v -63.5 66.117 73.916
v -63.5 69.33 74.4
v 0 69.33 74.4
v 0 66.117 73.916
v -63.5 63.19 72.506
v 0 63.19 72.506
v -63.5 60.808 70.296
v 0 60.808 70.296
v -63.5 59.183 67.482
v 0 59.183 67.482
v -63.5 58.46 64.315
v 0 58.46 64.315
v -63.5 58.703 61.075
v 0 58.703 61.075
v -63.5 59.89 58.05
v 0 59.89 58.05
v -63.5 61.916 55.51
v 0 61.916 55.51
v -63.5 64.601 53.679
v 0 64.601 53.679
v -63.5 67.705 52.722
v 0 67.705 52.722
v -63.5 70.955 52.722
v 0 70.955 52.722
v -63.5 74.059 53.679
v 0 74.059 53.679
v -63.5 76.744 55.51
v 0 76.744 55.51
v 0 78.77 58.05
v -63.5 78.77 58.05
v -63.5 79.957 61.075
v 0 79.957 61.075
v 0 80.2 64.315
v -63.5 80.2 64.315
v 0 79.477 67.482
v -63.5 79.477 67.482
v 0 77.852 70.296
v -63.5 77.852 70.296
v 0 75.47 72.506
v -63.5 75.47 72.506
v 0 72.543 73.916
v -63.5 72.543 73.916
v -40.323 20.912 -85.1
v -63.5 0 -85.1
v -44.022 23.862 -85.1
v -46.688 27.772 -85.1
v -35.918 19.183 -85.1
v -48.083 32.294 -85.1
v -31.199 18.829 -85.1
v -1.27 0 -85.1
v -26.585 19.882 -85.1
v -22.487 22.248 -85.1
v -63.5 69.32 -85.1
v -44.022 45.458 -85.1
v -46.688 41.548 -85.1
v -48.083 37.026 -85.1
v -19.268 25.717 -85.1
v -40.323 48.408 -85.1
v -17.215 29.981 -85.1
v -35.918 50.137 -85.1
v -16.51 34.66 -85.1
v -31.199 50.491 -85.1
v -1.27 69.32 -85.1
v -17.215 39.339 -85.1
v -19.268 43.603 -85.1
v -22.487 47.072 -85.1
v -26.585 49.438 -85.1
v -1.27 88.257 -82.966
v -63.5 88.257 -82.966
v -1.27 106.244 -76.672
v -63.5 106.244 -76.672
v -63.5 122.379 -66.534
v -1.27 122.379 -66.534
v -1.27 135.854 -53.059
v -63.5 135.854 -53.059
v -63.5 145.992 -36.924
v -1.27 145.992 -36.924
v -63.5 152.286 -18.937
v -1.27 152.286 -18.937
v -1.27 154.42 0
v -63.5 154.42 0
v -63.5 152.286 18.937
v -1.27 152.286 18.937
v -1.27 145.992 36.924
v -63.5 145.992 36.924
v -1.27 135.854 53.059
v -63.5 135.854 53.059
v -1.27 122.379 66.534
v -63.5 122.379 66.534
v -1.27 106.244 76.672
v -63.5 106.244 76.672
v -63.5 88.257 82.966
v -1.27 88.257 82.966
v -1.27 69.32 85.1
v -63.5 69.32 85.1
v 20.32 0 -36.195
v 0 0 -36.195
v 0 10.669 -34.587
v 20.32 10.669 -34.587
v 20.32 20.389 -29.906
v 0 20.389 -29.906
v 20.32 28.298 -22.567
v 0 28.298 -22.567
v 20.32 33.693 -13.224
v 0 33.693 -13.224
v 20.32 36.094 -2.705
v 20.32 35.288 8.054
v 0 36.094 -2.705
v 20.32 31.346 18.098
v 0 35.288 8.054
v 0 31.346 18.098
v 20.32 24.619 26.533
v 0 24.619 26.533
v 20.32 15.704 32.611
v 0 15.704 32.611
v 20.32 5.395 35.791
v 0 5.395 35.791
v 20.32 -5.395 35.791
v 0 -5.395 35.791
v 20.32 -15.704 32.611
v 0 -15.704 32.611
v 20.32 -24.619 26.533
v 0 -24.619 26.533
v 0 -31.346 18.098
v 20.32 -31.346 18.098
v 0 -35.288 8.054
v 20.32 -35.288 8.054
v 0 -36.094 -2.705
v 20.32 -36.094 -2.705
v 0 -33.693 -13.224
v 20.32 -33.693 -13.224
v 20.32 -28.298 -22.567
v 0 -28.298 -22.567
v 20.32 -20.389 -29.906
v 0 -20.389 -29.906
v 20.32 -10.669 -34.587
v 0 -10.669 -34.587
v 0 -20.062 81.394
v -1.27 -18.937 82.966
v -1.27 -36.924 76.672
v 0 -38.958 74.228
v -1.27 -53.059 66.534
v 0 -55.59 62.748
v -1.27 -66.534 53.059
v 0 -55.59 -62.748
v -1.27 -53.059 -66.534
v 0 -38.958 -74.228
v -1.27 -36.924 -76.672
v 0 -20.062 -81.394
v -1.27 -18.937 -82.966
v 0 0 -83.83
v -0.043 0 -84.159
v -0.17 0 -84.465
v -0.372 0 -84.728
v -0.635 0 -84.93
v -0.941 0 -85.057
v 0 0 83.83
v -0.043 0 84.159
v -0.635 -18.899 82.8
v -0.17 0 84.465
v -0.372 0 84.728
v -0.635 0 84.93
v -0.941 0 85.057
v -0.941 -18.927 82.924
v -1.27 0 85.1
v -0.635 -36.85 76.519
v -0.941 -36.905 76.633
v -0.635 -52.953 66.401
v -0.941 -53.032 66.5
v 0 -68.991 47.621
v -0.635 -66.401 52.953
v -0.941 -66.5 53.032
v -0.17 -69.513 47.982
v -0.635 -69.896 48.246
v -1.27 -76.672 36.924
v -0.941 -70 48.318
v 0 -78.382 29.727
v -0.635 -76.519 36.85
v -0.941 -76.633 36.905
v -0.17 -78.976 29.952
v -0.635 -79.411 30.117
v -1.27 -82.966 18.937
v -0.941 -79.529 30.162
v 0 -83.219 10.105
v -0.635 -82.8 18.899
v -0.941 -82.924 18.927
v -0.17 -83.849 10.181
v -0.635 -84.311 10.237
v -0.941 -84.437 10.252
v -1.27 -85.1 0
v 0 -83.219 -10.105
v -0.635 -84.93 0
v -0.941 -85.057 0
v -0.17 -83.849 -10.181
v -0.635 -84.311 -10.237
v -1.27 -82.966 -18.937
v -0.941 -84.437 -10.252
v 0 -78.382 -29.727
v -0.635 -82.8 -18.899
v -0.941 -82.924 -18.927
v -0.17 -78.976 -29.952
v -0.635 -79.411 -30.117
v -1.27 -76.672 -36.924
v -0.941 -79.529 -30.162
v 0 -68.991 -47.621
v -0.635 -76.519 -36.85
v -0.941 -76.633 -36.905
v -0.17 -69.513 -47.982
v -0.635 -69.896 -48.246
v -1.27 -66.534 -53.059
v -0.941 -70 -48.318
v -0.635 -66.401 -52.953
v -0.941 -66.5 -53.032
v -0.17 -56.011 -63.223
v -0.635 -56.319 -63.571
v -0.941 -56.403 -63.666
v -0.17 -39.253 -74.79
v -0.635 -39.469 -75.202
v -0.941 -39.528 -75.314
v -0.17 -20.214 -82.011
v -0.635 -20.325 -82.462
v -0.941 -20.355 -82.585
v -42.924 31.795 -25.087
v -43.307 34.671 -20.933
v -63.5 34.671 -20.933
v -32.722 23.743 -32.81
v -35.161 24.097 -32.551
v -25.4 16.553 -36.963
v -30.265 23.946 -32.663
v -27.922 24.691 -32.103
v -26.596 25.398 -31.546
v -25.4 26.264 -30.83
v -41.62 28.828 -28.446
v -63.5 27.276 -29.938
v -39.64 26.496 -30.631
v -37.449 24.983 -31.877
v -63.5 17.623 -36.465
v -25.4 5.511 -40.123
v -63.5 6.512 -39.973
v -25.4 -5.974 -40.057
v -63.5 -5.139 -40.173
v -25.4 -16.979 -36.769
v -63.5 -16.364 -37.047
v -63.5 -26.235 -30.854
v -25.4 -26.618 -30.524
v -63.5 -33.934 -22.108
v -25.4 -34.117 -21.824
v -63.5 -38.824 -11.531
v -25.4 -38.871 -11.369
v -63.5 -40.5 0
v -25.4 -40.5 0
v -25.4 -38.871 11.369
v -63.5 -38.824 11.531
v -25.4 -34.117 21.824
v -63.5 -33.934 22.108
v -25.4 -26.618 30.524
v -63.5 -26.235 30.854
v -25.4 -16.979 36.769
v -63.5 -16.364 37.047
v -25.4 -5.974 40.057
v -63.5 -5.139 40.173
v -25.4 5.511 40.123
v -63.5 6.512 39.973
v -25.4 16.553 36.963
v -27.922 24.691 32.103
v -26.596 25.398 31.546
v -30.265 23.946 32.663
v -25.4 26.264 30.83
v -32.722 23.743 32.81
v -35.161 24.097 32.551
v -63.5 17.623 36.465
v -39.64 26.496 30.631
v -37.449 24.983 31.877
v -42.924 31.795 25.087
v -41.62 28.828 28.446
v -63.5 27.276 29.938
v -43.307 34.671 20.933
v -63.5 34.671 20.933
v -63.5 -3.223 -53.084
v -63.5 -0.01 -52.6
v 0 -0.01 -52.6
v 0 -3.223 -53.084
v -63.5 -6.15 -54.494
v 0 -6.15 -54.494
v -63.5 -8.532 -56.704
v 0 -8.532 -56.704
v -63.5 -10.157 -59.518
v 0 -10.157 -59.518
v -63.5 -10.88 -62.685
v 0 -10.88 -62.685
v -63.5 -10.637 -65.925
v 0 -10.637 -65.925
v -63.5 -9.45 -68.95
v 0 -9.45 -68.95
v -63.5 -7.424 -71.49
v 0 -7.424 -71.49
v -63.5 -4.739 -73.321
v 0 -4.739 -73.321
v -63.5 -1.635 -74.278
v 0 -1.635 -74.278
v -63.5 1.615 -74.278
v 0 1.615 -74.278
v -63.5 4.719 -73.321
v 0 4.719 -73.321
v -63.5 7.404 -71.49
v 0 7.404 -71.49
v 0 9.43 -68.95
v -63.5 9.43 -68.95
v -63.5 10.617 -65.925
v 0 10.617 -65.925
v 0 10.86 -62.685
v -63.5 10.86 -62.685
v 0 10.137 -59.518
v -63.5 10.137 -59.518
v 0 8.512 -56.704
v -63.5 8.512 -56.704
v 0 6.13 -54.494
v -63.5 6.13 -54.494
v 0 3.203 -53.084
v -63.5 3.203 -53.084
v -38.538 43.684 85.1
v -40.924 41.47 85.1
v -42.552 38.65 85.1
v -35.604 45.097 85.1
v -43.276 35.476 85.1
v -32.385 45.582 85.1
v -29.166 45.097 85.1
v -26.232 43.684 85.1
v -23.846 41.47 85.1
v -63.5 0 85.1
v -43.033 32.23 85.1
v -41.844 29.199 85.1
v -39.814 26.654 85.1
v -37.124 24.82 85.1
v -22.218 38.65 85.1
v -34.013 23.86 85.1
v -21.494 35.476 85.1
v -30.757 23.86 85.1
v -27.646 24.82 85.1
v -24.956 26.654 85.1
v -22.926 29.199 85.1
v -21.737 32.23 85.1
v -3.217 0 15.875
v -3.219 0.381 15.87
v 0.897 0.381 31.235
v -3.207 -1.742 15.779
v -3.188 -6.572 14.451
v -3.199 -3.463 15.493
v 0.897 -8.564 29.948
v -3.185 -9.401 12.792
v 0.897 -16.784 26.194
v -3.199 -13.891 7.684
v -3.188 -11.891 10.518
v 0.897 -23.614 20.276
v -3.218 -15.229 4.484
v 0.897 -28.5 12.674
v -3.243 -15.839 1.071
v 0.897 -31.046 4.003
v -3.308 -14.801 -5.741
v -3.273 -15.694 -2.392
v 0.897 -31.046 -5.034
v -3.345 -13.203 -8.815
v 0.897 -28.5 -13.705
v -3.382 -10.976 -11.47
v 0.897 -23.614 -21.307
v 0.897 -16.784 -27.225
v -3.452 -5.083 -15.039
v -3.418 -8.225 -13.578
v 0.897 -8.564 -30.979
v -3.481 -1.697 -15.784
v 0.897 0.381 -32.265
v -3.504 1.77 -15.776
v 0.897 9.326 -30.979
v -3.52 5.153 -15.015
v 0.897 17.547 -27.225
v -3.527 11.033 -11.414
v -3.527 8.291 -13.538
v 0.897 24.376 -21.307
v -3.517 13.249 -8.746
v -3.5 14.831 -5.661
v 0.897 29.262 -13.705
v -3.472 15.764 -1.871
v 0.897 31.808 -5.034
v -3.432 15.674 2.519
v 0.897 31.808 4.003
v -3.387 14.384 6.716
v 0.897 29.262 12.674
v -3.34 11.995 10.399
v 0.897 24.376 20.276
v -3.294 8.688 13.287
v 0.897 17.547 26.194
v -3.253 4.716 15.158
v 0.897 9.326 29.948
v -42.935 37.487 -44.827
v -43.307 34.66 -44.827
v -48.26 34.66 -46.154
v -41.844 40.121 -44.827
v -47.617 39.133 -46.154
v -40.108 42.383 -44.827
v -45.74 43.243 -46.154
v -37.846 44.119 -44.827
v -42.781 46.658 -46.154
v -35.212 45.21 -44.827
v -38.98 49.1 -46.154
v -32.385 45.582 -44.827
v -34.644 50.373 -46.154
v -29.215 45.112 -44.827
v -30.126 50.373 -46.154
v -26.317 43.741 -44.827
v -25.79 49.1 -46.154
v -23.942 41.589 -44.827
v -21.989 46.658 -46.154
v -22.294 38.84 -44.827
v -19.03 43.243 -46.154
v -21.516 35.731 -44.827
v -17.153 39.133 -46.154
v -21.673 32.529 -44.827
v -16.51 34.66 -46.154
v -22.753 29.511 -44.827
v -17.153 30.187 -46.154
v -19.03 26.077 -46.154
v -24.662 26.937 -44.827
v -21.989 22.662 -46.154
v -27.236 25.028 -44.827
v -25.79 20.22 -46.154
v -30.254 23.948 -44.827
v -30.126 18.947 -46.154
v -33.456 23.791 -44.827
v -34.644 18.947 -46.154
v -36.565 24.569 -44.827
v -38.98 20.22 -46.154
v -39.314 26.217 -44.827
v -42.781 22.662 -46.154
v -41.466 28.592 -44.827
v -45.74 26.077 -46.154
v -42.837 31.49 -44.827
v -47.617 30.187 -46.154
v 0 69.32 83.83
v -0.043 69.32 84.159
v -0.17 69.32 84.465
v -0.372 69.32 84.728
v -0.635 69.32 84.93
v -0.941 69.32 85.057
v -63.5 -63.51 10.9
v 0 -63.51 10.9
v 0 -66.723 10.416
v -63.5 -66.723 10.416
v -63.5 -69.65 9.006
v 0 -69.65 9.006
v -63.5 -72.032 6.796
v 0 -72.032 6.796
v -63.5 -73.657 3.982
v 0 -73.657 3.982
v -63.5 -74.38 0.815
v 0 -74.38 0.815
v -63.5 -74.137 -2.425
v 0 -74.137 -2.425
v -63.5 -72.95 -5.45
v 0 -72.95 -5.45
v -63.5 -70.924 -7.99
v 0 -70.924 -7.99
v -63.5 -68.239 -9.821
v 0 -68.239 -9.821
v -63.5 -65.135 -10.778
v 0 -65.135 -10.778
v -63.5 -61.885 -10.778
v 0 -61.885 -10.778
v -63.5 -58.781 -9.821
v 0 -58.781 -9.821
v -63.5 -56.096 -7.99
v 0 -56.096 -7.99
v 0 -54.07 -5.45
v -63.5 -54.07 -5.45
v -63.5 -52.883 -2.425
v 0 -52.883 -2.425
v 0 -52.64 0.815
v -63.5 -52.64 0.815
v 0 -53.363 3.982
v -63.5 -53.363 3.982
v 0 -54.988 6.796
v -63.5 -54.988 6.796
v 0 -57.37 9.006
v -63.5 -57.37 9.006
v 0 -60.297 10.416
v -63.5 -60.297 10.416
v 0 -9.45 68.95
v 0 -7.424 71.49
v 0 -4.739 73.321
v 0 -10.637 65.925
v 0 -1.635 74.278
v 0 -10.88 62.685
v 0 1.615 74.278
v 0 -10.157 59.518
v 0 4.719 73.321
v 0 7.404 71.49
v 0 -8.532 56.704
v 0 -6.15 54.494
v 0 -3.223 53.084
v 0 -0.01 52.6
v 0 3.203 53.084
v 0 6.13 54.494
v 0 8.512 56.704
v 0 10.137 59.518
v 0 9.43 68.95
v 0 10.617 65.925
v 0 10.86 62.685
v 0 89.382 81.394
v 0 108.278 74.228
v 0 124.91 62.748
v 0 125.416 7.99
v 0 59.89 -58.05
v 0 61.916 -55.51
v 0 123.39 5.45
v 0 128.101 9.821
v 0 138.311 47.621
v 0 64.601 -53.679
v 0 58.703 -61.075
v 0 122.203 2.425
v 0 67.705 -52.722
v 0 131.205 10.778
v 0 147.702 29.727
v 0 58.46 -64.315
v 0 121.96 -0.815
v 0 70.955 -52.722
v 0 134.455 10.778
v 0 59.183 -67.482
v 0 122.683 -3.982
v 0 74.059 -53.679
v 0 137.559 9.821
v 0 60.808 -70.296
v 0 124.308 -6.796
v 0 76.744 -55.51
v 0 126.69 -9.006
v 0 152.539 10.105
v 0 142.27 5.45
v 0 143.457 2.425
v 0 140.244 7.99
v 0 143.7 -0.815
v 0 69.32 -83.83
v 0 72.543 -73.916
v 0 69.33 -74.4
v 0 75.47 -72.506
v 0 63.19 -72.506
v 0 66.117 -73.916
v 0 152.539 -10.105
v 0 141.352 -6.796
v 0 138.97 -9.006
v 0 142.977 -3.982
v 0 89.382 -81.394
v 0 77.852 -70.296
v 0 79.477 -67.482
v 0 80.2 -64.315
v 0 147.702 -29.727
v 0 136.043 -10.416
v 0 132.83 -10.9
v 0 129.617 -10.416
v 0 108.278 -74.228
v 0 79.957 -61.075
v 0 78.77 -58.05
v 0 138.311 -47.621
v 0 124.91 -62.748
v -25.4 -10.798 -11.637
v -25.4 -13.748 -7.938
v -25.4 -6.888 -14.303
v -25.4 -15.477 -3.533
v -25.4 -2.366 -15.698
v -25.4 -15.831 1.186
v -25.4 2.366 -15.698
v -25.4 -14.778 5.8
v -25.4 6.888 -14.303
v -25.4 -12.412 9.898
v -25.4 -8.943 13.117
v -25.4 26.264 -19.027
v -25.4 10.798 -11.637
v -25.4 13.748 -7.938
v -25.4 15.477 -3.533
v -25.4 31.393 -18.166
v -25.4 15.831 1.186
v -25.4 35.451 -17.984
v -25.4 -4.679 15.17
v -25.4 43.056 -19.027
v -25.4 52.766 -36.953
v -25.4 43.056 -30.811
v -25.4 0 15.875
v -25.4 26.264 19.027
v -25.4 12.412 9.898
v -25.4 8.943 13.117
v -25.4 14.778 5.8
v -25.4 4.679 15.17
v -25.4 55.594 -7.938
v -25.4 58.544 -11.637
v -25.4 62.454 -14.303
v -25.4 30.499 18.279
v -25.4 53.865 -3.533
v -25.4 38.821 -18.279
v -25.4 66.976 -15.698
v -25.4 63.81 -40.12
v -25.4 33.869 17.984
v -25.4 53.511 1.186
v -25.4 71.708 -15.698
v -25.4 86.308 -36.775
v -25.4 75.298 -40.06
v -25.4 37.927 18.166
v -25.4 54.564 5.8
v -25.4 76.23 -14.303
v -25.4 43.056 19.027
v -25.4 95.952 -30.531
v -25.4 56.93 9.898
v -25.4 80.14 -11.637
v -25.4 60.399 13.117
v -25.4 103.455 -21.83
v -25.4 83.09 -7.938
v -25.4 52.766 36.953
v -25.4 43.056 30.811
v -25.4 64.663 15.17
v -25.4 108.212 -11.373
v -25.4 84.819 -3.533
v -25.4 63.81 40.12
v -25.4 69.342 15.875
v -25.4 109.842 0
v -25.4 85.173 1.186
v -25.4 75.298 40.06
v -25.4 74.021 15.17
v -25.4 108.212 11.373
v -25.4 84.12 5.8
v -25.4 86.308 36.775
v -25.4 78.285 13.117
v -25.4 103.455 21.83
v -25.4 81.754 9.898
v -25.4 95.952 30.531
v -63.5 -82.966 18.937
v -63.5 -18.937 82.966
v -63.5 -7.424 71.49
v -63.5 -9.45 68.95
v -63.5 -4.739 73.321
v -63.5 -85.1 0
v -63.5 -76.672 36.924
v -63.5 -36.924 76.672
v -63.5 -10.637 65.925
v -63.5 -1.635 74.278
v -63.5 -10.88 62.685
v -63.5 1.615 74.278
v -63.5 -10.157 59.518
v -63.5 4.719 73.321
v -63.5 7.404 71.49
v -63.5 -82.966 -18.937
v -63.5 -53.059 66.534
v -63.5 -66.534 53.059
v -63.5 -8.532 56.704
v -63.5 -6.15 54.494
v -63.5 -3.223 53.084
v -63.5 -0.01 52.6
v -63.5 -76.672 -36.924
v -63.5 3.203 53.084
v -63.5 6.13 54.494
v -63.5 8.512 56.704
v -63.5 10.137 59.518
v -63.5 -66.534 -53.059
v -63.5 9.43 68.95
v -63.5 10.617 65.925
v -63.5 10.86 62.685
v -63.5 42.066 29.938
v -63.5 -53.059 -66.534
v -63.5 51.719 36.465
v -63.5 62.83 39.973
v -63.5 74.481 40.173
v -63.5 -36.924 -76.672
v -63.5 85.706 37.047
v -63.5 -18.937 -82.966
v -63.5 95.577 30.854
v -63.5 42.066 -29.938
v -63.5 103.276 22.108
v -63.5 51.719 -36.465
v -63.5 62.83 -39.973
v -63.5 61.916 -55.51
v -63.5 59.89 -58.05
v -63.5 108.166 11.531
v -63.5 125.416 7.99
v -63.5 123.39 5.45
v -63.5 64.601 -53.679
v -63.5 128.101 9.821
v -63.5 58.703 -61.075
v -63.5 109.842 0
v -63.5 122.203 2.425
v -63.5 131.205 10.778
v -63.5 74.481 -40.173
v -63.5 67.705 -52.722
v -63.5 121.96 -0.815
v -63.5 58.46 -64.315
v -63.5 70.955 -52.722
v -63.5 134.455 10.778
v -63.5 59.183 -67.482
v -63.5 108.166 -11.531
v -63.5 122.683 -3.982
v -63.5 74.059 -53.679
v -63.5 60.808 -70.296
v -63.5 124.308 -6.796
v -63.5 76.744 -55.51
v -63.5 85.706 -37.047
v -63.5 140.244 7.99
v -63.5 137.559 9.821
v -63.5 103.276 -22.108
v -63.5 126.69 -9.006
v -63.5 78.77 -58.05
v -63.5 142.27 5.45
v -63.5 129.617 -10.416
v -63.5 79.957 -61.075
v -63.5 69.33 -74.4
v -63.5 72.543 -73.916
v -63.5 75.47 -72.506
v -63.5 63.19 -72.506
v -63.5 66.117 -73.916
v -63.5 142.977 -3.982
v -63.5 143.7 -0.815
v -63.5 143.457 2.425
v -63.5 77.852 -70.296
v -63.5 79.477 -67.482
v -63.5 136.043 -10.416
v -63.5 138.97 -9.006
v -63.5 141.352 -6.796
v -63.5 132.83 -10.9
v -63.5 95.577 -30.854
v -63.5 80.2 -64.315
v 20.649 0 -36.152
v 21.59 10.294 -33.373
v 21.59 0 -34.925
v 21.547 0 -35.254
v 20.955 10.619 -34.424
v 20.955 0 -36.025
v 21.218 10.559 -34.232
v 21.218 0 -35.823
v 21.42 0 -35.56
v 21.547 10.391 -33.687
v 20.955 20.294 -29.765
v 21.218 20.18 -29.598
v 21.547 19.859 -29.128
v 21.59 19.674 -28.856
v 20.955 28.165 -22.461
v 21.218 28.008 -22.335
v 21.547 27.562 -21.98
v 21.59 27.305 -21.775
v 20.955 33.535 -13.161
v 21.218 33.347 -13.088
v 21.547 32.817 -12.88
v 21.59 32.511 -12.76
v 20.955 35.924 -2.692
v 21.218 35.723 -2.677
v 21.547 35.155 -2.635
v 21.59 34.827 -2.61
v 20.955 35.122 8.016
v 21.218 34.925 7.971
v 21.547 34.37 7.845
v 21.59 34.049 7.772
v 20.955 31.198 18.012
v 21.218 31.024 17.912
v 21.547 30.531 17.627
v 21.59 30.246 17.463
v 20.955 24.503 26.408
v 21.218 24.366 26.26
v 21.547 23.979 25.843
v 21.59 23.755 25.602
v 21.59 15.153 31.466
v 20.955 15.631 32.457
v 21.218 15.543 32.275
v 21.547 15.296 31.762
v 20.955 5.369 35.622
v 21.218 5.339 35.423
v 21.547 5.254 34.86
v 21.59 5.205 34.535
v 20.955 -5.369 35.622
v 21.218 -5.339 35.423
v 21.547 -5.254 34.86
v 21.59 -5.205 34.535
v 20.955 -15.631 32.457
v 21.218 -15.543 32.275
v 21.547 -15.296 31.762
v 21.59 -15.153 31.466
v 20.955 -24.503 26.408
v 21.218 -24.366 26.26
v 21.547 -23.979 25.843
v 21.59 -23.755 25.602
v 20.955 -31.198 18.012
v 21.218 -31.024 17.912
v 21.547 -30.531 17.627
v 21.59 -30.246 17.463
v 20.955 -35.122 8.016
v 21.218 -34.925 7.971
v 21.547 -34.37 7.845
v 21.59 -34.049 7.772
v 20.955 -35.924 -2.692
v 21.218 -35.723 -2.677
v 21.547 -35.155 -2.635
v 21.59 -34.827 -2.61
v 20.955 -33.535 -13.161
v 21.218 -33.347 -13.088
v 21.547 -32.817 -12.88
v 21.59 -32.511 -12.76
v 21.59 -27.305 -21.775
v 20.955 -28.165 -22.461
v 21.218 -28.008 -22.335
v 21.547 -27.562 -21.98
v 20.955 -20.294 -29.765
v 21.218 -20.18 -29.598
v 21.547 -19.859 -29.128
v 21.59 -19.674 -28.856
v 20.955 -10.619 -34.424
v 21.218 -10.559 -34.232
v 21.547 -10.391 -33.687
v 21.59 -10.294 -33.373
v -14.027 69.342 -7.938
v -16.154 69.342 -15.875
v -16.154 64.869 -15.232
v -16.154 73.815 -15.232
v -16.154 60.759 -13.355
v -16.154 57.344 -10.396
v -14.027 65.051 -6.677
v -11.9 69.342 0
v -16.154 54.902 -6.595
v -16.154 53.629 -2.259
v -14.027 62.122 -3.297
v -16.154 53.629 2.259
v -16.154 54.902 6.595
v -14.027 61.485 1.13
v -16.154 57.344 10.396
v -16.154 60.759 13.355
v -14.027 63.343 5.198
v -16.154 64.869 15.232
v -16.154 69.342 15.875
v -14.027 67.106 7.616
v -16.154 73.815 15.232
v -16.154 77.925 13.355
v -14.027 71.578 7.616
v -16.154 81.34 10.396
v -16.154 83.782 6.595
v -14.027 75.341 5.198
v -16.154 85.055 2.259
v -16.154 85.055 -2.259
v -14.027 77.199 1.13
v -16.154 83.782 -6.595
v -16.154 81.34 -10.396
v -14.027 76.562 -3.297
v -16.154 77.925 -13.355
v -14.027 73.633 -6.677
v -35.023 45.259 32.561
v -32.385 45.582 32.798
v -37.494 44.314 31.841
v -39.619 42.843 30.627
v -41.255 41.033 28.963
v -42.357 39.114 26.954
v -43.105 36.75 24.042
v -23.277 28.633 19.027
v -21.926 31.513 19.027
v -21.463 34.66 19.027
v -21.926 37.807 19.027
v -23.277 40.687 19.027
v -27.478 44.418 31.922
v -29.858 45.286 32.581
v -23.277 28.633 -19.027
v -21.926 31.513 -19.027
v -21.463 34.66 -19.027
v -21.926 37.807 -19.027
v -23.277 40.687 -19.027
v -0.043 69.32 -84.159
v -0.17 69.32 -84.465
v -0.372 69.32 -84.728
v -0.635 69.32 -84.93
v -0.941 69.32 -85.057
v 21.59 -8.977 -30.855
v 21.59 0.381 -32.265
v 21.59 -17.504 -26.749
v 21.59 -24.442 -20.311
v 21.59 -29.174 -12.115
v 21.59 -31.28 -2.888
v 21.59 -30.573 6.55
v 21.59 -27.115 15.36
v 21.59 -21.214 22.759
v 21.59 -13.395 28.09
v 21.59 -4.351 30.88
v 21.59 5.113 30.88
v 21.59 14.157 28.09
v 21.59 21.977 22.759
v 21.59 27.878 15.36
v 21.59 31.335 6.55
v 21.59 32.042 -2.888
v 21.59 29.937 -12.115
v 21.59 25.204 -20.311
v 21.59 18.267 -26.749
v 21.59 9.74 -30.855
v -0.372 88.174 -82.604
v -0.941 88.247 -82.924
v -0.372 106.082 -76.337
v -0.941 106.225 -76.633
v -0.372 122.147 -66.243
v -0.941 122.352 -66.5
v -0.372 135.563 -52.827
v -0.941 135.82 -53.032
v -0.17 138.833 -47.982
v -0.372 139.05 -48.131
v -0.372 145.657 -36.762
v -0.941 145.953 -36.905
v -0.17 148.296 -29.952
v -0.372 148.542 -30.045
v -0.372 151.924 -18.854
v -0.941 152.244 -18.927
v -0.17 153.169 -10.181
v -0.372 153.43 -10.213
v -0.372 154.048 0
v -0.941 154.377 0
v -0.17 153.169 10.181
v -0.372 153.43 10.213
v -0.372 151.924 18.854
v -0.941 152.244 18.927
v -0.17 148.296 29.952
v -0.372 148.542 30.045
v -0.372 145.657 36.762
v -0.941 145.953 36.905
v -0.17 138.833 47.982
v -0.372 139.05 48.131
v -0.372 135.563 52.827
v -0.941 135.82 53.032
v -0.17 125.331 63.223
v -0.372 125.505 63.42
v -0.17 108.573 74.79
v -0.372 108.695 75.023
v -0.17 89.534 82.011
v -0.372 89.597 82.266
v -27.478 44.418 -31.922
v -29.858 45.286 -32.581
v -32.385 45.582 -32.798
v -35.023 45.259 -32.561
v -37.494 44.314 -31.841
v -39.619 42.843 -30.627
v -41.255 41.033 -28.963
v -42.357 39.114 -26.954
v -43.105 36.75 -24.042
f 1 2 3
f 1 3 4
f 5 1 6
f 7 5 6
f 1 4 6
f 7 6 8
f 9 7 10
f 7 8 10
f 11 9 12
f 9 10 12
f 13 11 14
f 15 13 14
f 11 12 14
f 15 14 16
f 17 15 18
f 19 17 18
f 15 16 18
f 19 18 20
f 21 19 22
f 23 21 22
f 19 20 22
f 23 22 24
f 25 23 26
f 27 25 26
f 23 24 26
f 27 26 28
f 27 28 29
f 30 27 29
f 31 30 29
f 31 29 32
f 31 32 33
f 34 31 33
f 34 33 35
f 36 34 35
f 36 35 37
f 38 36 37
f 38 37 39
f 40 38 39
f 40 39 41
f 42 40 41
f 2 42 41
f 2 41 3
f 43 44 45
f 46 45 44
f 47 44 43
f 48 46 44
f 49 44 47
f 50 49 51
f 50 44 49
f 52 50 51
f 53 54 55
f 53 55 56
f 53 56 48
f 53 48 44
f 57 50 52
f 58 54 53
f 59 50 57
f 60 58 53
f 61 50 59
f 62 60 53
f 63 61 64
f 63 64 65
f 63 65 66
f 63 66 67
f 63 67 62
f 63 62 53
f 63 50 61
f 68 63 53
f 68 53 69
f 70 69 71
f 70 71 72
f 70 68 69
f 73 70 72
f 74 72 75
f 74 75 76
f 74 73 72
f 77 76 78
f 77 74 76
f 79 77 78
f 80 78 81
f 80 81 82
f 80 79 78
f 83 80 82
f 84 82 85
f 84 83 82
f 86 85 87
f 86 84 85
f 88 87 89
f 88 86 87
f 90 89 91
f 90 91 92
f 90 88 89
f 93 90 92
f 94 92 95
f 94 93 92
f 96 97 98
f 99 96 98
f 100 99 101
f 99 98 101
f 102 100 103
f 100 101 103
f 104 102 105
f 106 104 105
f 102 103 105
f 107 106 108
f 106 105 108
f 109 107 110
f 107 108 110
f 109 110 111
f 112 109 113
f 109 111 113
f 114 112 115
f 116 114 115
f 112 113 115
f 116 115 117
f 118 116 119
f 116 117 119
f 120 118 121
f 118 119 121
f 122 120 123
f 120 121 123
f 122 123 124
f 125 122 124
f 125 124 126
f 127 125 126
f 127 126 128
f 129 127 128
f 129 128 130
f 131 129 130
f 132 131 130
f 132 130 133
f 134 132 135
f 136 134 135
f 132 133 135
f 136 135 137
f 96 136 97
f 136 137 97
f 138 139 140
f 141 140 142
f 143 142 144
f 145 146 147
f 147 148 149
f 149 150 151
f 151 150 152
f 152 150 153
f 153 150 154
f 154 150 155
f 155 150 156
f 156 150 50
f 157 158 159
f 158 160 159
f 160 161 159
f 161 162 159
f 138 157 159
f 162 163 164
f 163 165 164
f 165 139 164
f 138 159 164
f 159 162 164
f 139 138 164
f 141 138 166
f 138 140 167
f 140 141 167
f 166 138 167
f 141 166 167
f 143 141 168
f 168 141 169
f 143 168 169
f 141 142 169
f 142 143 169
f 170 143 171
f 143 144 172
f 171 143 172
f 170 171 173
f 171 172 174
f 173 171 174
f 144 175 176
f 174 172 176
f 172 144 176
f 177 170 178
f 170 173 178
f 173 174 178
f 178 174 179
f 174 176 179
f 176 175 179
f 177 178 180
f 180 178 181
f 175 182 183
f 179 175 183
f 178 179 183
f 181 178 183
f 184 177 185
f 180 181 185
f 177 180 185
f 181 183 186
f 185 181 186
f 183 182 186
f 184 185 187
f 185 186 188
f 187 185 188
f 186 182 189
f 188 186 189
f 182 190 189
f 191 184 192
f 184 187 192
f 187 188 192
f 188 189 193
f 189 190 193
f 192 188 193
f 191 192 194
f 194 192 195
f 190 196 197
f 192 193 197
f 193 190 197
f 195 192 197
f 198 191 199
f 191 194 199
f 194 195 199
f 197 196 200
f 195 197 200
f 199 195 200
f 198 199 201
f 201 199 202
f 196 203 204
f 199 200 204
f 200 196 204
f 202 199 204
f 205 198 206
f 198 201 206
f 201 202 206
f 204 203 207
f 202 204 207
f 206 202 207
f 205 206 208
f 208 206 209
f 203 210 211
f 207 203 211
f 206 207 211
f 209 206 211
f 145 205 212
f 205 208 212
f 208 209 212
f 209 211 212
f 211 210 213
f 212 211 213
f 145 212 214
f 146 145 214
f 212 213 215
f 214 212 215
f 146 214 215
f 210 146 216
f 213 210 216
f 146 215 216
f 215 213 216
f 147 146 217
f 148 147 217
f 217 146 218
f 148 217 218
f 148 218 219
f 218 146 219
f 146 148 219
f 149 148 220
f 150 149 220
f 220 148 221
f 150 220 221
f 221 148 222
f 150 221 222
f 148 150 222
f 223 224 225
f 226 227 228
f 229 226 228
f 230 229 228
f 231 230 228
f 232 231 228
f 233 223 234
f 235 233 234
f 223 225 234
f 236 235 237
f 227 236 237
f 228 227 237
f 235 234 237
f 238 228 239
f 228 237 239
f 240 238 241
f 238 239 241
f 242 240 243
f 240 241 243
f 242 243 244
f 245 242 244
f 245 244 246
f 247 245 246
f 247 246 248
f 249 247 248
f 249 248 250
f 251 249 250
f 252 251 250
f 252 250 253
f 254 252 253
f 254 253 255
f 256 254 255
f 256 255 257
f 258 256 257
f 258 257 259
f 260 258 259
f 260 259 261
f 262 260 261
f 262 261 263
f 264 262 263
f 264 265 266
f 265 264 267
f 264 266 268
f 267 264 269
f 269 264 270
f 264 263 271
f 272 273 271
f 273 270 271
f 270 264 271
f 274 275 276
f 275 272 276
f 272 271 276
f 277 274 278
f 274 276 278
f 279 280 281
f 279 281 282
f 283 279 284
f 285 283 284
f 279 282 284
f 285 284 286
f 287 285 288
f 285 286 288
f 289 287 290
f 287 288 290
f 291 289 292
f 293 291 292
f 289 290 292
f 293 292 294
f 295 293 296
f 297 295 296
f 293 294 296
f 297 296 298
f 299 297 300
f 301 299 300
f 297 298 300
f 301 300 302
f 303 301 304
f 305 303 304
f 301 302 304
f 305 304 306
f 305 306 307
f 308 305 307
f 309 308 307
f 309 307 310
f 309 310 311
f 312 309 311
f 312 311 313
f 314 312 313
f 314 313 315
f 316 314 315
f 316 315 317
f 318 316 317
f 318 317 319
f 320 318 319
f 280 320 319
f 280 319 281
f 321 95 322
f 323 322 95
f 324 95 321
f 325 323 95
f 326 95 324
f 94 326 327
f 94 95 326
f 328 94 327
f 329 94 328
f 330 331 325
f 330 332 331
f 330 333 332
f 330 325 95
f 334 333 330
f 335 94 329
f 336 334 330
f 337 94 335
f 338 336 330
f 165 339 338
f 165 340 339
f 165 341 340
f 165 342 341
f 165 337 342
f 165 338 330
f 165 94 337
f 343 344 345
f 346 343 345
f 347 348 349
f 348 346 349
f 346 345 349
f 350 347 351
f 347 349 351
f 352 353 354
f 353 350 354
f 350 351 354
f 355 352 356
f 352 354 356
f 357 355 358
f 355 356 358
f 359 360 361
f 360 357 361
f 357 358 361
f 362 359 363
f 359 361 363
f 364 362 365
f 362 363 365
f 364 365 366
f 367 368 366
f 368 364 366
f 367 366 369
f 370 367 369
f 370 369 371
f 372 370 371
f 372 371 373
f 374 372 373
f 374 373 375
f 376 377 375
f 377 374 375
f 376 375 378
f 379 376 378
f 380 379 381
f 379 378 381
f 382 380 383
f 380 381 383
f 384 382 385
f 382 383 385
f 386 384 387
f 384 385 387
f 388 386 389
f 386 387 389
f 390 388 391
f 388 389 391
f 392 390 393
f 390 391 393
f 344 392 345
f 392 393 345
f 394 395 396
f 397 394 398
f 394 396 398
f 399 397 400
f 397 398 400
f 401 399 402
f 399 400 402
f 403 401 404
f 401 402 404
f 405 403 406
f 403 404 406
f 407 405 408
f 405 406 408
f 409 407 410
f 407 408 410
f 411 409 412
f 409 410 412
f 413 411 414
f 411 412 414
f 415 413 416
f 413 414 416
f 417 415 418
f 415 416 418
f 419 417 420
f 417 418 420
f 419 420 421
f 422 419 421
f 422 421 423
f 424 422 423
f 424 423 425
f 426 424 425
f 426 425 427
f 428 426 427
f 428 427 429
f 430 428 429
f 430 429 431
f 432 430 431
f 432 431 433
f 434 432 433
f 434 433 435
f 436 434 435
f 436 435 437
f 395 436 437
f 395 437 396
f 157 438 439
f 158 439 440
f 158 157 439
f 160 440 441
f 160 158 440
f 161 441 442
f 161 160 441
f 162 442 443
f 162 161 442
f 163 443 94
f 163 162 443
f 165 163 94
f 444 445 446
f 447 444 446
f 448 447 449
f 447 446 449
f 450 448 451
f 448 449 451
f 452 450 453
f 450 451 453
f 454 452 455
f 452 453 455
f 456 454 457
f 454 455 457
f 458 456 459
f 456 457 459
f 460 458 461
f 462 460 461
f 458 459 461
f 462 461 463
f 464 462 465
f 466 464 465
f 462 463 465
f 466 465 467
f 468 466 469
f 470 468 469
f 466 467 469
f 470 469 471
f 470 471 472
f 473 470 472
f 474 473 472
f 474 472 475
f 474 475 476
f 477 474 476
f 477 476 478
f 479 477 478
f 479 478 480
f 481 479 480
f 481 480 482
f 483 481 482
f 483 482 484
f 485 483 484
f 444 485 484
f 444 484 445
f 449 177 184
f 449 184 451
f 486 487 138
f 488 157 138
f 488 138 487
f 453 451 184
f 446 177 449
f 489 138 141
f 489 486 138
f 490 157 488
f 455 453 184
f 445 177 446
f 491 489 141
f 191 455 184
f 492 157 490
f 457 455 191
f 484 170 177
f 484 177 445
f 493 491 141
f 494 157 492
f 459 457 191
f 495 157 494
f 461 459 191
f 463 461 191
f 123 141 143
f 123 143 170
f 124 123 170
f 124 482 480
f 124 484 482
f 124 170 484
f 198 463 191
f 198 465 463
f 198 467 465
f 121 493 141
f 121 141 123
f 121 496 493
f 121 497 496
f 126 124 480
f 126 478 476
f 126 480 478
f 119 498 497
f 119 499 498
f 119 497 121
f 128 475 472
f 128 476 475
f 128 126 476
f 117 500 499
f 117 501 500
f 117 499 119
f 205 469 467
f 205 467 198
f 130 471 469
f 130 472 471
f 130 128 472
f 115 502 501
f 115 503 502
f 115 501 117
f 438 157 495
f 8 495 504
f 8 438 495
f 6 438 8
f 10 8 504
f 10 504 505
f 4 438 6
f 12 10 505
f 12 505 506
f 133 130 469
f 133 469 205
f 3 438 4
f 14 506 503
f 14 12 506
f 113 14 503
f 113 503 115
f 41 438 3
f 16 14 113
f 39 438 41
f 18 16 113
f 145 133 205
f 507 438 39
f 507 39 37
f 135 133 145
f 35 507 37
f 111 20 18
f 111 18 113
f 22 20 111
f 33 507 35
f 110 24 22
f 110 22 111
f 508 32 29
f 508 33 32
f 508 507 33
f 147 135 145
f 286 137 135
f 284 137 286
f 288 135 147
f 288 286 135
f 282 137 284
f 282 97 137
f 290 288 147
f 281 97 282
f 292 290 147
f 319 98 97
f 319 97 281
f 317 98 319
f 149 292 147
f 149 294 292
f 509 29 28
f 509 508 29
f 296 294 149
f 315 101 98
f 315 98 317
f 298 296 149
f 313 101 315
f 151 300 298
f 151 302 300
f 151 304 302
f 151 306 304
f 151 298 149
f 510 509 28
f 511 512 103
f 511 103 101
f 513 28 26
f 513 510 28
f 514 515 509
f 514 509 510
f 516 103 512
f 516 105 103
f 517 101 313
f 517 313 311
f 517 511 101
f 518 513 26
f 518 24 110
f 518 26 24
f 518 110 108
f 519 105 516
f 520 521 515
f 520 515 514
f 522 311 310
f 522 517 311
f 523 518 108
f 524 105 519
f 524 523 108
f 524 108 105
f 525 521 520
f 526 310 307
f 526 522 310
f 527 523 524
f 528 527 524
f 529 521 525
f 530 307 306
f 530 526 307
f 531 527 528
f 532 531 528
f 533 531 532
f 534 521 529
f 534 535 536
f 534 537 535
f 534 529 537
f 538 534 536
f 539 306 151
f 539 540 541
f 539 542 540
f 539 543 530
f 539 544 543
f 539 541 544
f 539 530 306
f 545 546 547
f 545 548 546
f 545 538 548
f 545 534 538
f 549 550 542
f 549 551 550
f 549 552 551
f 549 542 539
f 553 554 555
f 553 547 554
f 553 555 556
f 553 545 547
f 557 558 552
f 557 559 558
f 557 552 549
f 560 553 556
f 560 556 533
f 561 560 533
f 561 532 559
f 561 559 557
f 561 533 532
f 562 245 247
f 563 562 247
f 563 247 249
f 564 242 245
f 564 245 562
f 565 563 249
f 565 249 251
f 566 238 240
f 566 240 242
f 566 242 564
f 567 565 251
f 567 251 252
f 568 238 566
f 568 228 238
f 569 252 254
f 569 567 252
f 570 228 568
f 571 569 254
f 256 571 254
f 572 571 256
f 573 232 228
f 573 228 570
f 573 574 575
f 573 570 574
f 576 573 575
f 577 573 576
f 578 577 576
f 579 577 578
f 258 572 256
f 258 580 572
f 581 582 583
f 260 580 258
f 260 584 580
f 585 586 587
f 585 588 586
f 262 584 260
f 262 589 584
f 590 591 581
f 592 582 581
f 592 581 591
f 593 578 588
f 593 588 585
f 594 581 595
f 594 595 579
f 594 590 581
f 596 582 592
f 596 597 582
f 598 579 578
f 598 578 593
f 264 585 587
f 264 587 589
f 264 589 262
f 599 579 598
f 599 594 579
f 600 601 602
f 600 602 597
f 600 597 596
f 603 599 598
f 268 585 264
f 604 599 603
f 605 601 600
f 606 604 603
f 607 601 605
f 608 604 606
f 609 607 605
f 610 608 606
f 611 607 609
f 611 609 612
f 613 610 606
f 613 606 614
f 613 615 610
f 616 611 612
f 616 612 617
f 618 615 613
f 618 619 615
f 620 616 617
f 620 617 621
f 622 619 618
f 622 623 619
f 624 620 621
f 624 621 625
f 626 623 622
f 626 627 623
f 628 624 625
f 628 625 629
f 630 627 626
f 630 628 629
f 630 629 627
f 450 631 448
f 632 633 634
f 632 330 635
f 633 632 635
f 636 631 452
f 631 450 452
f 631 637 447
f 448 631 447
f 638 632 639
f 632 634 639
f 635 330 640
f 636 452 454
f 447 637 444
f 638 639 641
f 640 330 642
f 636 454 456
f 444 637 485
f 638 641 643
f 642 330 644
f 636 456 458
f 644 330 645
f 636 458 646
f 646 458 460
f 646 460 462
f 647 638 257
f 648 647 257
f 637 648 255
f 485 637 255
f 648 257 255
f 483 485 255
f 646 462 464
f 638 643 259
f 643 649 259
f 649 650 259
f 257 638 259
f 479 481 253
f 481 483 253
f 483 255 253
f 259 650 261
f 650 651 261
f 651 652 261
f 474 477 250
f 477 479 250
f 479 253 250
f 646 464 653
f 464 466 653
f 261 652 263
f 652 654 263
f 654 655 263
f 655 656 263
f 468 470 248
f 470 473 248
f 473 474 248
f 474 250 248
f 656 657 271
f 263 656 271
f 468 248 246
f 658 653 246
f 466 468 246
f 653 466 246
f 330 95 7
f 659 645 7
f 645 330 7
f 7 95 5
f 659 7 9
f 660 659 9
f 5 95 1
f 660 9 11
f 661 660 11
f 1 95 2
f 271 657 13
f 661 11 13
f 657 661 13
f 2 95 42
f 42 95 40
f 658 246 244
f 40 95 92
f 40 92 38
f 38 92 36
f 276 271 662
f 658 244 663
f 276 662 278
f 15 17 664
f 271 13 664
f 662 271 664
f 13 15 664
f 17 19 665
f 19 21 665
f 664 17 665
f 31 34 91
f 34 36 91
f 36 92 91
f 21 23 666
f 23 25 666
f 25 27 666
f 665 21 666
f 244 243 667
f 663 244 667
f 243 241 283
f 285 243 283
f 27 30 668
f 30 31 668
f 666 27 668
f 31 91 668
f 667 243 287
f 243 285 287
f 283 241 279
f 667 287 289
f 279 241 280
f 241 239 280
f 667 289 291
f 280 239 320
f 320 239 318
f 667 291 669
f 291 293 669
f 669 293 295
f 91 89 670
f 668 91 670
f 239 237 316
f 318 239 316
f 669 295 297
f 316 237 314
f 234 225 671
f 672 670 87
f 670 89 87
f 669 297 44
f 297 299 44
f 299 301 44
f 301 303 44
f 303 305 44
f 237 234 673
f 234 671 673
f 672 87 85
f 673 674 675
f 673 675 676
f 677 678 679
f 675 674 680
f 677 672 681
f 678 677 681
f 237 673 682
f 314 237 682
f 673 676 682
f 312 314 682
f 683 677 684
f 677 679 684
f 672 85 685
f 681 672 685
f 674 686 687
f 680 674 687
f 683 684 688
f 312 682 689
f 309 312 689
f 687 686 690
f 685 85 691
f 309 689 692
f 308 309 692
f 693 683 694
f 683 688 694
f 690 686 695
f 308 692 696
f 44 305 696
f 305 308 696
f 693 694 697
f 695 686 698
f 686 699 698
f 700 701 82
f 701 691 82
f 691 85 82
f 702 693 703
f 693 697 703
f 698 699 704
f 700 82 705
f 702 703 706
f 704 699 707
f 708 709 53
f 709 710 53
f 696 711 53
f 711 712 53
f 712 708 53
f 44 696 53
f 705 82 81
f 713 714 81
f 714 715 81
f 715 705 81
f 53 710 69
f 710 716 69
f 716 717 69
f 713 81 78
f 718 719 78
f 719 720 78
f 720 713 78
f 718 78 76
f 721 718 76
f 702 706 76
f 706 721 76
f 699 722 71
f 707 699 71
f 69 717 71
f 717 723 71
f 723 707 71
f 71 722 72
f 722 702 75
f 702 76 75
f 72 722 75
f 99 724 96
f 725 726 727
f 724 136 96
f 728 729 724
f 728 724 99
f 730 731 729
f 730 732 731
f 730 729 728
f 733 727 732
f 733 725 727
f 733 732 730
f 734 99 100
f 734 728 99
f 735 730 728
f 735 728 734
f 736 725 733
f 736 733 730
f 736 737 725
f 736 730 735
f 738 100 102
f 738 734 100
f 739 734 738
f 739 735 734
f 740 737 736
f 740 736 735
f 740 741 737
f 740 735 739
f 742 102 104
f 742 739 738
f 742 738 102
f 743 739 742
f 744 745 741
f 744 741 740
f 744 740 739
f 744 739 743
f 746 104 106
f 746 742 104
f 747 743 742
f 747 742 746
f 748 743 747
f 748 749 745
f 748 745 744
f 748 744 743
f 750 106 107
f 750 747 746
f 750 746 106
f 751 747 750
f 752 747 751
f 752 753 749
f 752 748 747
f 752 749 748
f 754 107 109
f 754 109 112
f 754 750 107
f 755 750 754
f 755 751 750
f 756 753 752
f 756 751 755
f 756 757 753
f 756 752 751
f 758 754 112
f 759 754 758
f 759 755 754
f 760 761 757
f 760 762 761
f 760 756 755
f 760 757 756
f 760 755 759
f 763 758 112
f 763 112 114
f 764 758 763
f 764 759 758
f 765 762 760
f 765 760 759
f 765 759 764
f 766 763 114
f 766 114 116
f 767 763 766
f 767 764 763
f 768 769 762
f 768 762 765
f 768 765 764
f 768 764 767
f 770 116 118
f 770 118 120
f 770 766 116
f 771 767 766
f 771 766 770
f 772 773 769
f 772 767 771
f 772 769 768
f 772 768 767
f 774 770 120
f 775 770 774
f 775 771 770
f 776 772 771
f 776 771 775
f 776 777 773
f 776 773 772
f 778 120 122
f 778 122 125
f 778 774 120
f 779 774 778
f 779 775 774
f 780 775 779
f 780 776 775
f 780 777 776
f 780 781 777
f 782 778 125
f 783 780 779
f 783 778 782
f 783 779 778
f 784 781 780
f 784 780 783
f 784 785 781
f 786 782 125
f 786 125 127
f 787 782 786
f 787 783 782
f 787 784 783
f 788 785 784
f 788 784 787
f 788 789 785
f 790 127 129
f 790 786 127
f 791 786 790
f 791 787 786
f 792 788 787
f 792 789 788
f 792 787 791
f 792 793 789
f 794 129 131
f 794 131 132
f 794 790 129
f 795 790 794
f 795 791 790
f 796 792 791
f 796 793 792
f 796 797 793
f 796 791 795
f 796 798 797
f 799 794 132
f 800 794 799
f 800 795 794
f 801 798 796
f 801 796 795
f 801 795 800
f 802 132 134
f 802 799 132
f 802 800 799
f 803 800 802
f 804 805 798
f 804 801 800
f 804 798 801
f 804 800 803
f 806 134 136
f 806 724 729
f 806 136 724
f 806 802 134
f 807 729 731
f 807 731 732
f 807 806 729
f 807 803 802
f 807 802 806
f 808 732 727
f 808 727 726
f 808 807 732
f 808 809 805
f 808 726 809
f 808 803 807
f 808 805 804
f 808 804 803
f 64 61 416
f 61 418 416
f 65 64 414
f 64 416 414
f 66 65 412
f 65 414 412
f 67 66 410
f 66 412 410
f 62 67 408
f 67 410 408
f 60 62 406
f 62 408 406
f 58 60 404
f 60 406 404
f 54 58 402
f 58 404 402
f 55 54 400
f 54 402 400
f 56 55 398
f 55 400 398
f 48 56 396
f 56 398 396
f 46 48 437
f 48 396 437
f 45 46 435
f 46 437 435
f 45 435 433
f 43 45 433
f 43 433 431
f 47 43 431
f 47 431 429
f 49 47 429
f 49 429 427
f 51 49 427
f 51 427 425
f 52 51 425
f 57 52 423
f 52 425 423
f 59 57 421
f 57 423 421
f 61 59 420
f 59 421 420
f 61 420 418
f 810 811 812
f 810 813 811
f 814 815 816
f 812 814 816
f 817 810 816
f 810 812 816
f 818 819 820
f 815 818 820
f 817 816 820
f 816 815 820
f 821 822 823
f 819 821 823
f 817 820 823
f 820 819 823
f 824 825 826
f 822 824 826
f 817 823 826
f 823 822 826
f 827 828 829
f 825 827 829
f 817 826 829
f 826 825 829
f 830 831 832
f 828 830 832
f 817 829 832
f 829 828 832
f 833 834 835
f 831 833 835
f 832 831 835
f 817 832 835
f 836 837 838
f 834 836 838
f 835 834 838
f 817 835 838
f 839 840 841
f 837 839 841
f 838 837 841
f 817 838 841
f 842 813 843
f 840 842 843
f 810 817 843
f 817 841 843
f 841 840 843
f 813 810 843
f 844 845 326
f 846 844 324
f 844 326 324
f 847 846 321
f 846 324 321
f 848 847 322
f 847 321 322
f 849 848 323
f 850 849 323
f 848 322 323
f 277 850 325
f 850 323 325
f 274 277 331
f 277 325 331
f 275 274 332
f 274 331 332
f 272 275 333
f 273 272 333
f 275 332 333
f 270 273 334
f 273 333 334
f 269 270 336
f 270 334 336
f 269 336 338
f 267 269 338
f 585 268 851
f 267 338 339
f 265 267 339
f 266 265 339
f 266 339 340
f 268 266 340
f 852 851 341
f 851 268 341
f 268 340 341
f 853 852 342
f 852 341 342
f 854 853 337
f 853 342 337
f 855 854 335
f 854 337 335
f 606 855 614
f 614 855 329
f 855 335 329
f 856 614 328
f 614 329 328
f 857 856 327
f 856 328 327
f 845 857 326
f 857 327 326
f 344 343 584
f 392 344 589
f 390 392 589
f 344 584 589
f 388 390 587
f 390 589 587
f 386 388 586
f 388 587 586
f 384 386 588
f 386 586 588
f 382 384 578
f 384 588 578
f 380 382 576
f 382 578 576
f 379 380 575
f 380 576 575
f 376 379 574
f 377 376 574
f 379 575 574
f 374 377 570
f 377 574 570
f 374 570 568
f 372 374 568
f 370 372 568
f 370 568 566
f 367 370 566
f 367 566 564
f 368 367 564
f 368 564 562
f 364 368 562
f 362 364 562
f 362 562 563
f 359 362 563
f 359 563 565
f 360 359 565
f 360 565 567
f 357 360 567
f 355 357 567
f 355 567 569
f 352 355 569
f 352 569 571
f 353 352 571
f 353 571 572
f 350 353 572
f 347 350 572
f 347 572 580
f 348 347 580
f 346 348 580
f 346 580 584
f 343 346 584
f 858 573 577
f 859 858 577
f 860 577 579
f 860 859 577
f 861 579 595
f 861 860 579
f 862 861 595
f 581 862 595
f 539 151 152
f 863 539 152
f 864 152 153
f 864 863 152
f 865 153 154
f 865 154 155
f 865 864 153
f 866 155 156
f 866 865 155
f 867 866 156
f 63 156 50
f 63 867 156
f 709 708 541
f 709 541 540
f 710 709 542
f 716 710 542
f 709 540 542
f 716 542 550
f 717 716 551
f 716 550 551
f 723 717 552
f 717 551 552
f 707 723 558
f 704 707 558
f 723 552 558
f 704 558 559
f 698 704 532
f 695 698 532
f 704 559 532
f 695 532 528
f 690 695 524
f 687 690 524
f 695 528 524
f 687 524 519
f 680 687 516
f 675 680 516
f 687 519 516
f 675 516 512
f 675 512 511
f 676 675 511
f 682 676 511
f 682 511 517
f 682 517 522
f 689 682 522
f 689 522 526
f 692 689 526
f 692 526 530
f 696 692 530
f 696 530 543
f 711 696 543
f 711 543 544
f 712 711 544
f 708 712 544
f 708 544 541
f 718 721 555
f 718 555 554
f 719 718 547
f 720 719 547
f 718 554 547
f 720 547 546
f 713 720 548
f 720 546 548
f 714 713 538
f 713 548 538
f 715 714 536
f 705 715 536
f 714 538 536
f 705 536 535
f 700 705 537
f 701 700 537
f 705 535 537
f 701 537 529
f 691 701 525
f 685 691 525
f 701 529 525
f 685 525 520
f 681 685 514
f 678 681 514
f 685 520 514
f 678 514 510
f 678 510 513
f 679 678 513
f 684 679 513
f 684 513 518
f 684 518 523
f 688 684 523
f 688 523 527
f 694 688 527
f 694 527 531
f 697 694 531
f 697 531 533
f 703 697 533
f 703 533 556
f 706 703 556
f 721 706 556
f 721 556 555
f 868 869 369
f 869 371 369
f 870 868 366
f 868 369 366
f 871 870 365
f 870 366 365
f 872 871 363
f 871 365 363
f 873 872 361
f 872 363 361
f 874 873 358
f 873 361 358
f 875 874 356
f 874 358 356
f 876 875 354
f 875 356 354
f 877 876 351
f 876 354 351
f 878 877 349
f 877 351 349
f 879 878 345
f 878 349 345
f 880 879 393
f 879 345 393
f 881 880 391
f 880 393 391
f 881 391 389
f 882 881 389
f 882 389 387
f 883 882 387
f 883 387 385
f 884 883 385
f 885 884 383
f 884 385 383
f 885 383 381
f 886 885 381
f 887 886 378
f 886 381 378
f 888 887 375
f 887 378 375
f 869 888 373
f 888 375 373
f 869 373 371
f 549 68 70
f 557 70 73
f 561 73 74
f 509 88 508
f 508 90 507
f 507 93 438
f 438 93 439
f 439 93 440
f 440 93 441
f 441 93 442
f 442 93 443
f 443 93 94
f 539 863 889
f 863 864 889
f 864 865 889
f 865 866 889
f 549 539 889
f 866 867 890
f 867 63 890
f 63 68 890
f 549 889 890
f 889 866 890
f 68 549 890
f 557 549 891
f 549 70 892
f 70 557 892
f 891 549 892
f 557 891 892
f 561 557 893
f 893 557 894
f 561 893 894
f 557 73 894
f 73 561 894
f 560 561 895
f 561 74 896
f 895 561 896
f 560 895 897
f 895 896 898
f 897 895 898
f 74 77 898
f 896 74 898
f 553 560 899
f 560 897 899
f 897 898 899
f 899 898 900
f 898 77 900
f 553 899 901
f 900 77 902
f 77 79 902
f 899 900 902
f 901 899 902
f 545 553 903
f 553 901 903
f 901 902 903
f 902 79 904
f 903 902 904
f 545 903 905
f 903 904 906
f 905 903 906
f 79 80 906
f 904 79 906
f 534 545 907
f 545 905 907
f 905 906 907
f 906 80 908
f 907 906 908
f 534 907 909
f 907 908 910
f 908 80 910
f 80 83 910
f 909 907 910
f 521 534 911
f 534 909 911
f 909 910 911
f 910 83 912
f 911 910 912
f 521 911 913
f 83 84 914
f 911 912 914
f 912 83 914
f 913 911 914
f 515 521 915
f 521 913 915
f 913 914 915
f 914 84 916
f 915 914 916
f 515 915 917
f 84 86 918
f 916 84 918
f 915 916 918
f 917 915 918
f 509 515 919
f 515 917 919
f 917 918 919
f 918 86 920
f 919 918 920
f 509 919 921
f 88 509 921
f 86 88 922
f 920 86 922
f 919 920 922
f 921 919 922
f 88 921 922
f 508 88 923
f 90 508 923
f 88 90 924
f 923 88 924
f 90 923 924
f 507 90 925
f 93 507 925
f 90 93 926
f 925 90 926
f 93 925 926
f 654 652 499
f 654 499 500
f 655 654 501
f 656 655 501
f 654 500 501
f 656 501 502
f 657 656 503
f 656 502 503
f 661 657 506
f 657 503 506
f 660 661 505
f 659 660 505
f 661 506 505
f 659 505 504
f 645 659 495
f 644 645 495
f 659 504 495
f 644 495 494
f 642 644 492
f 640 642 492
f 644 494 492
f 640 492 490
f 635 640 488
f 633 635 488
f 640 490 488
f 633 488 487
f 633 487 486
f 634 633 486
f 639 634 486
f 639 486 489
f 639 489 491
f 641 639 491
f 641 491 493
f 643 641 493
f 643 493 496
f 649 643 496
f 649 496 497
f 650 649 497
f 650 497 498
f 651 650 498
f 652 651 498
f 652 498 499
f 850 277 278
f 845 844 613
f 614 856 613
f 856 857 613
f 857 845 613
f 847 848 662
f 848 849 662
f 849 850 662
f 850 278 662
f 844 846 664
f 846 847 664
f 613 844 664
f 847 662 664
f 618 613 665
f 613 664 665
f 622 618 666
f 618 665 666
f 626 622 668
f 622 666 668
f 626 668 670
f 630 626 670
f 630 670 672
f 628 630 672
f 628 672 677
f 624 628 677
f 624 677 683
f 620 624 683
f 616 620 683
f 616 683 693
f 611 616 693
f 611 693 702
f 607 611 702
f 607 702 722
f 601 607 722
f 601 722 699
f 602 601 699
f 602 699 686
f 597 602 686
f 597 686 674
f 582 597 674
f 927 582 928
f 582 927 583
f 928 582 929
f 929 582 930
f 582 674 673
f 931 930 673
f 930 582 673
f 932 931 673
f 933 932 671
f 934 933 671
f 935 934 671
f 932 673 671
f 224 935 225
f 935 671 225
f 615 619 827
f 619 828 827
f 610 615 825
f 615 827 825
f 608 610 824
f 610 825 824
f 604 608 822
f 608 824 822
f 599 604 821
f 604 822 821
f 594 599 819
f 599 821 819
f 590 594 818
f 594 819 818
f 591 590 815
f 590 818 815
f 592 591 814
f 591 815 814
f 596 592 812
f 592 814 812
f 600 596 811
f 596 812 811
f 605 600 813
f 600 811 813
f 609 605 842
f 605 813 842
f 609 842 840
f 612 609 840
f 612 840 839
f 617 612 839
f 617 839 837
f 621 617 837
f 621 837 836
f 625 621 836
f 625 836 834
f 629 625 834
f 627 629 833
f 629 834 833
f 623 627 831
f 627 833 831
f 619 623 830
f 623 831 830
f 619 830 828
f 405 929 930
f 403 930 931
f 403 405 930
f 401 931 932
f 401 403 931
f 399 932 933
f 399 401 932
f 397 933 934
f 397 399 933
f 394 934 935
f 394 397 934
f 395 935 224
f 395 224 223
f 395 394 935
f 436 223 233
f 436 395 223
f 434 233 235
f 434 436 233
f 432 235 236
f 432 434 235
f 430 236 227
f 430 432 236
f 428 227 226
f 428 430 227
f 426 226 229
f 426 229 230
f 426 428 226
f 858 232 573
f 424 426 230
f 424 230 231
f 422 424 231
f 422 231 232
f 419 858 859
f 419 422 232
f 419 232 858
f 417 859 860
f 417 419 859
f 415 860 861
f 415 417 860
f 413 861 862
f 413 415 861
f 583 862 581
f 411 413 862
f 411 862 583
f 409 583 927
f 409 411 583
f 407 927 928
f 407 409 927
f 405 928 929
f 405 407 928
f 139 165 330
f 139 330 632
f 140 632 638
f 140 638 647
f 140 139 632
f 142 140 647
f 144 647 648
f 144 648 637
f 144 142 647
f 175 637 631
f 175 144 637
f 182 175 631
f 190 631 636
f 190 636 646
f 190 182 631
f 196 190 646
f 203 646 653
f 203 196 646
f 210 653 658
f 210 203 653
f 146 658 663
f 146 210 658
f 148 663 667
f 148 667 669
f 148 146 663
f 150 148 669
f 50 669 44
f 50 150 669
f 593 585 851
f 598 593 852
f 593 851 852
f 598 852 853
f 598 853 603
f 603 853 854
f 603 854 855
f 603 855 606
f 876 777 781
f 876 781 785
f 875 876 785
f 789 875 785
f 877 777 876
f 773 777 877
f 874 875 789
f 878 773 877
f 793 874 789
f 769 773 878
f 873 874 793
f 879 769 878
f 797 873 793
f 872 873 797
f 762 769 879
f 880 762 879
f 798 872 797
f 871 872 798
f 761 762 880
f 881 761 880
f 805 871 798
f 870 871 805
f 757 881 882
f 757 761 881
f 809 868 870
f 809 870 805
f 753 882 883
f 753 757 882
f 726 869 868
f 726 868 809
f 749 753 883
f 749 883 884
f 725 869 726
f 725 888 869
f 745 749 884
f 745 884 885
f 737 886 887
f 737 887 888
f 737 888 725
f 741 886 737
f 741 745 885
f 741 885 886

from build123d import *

# Parameters (mm, degrees)
BOSS_EXTRUDE1_DEPTH              = 63.5
SKETCH2_R                        = 10.9
CUT_EXTRUDE1_DEPTH               = 188.402765188
CUT_EXTRUDE2_DEPTH               = 38.1
SKETCH5_R                        = 36.195
BOSS_EXTRUDE2_DEPTH              = 21.59
F_97_2_5_DIAMETER_HOLE2_D        = 63.5
F_97_2_5_DIAMETER_HOLE2_DEPTH    = 20.69261314
F_97_2_5_DIAMETER_HOLE2_TIP      = 8.50738686
SKETCH11_R                       = 15.875
CUT_EXTRUDE3_DEPTH               = 183.470837396
F_97_1_25_DIAMETER_HOLE4_D       = 31.75
F_97_1_25_DIAMETER_HOLE4_DEPTH   = 9.24630657
F_97_1_25_DIAMETER_HOLE4_TIP     = 4.25369343
FILLET1_R                        = 1.27
F_1_16_1_25_DIAMETER_HOLE1_D     = 31.75
F_1_16_1_25_DIAMETER_HOLE1_DEPTH = 38.94630657
F_1_16_1_25_DIAMETER_HOLE1_TIP   = 4.25369343


with BuildPart() as part:
    # Sketch1 → Boss-Extrude1 (new body)
    with BuildSketch(Plane(origin=(0, 0, 0), x_dir=(0, 0, -1), z_dir=(1, 0, 0))):
        with BuildLine():
            Line((-85.1, 69.32), (-85.1, 0))
            ThreePointArc((-85.1, 0), (0, -85.1), (85.1, 0))
            Line((85.1, 0), (85.1, 69.32))
            ThreePointArc((85.1, 69.32), (0, 154.42), (-85.1, 69.32))
        make_face()
    extrude(amount=-BOSS_EXTRUDE1_DEPTH)

    # Sketch2 → Cut-Extrude1 (cut, through all)
    with BuildSketch(Plane(origin=(0, 0, 0), x_dir=(0, 0, -1), z_dir=(1, 0, 0))):
        with Locations((0, 132.83)):
            Circle(SKETCH2_R)
        with Locations((63.5, 69.33)):
            Circle(SKETCH2_R)
        with Locations(Location((-63.5, 69.33, 0), (0, 0, 180))):
            Circle(SKETCH2_R)
        with Locations(Location((63.5, -0.01, 0), (0, 0, 180))):
            Circle(SKETCH2_R)
        with Locations((-63.5, -0.01)):
            Circle(SKETCH2_R)
        with Locations(Location((0, -63.51, 0), (0, 0, 180))):
            Circle(SKETCH2_R)
    extrude(amount=-CUT_EXTRUDE1_DEPTH, mode=Mode.SUBTRACT)

    # Sketch3 → Cut-Extrude2 (cut)
    with BuildSketch(Plane.ZY.offset(63.5)):
        with BuildLine():
            ThreePointArc((-20.932552615, 34.671), (0, -40.5), (20.932552615, 34.671))
            ThreePointArc((20.932552615, 34.671), (0, 109.842), (-20.932552615, 34.671))
        make_face()
    extrude(amount=-CUT_EXTRUDE2_DEPTH, mode=Mode.SUBTRACT)

    # Sketch5 → Boss-Extrude2 (add)
    with BuildSketch(Plane(origin=(0, 0, 0), x_dir=(0, 0, -1), z_dir=(1, 0, 0))):
        Circle(SKETCH5_R)
    extrude(amount=BOSS_EXTRUDE2_DEPTH)

    # #97 (2.5) Diameter Hole2
    with Locations(Plane(origin=(21.59, 0.381274274, -0.515455507), x_dir=(0, 0, 1), z_dir=(1, 0, 0))):
        with Locations((0, 0)):
            Hole(F_97_2_5_DIAMETER_HOLE2_D / 2, depth=F_97_2_5_DIAMETER_HOLE2_DEPTH)
            with Locations((0, 0, -(F_97_2_5_DIAMETER_HOLE2_DEPTH + F_97_2_5_DIAMETER_HOLE2_TIP / 2))):  # 150° drill point
                Cone(0, F_97_2_5_DIAMETER_HOLE2_D / 2, F_97_2_5_DIAMETER_HOLE2_TIP, mode=Mode.SUBTRACT)

    # Sketch11 → Cut-Extrude3 (cut, through all)
    with BuildSketch(Plane.ZY.offset(25.4)):
        Circle(SKETCH11_R)
    extrude(amount=-CUT_EXTRUDE3_DEPTH, mode=Mode.SUBTRACT)

    # #97 (1.25) Diameter Hole4
    with Locations(Plane(origin=(-25.4, 69.342, 0), x_dir=(0, 0, -1), z_dir=(-1, 0, 0))):
        with Locations((0, 0)):
            Hole(F_97_1_25_DIAMETER_HOLE4_D / 2, depth=F_97_1_25_DIAMETER_HOLE4_DEPTH)
            with Locations((0, 0, -(F_97_1_25_DIAMETER_HOLE4_DEPTH + F_97_1_25_DIAMETER_HOLE4_TIP / 2))):  # 150° drill point
                Cone(0, F_97_1_25_DIAMETER_HOLE4_D / 2, F_97_1_25_DIAMETER_HOLE4_TIP, mode=Mode.SUBTRACT)

    # Fillet1
    fillet1_edges = [part.edges().sort_by_distance(p)[0] for p in [
        (0, 34.66, -85.1),
        (0, -85.1, 0),
        (0, 34.66, 85.1),
        (0, 154.42, 0),
        (21.59, 0, 36.195),
    ]]
    fillet(fillet1_edges, radius=FILLET1_R)

    # Sketch18 → 1/16 (0.86) Diameter Hole1 (revolve, cut)
    with BuildSketch(Plane(origin=(-32.385, 34.66, -85.1), x_dir=(0, 1, 0), z_dir=(1, 0, 0))):
        Polygon((0, 0), (0, 69), (10.922, 66.07345892), (10.922, 0), align=None)
    f_1_16_0_86_diameter_hole1 = revolve(axis=Axis((-32.385, 34.66, -91.45), (0, 0, 1)), mode=Mode.SUBTRACT)

    # Mirror1: 1/16 (0.86) Diameter Hole1 across plane
    add(f_1_16_0_86_diameter_hole1.mirror(Plane(origin=(0, 0, 0), x_dir=(1, 0, 0), z_dir=(0, 0, -1))), mode=Mode.SUBTRACT)

    # 1/16 (1.25) Diameter Hole1
    with Locations(Plane(origin=(-32.385, 34.66, -85.1), x_dir=(-1, 0, 0), z_dir=(0, 0, -1))):
        with Locations((0, 0)):
            Hole(F_1_16_1_25_DIAMETER_HOLE1_D / 2, depth=F_1_16_1_25_DIAMETER_HOLE1_DEPTH)
            with Locations((0, 0, -(F_1_16_1_25_DIAMETER_HOLE1_DEPTH + F_1_16_1_25_DIAMETER_HOLE1_TIP / 2))):  # 150° drill point
                Cone(0, F_1_16_1_25_DIAMETER_HOLE1_D / 2, F_1_16_1_25_DIAMETER_HOLE1_TIP, mode=Mode.SUBTRACT)


solid = part.part
